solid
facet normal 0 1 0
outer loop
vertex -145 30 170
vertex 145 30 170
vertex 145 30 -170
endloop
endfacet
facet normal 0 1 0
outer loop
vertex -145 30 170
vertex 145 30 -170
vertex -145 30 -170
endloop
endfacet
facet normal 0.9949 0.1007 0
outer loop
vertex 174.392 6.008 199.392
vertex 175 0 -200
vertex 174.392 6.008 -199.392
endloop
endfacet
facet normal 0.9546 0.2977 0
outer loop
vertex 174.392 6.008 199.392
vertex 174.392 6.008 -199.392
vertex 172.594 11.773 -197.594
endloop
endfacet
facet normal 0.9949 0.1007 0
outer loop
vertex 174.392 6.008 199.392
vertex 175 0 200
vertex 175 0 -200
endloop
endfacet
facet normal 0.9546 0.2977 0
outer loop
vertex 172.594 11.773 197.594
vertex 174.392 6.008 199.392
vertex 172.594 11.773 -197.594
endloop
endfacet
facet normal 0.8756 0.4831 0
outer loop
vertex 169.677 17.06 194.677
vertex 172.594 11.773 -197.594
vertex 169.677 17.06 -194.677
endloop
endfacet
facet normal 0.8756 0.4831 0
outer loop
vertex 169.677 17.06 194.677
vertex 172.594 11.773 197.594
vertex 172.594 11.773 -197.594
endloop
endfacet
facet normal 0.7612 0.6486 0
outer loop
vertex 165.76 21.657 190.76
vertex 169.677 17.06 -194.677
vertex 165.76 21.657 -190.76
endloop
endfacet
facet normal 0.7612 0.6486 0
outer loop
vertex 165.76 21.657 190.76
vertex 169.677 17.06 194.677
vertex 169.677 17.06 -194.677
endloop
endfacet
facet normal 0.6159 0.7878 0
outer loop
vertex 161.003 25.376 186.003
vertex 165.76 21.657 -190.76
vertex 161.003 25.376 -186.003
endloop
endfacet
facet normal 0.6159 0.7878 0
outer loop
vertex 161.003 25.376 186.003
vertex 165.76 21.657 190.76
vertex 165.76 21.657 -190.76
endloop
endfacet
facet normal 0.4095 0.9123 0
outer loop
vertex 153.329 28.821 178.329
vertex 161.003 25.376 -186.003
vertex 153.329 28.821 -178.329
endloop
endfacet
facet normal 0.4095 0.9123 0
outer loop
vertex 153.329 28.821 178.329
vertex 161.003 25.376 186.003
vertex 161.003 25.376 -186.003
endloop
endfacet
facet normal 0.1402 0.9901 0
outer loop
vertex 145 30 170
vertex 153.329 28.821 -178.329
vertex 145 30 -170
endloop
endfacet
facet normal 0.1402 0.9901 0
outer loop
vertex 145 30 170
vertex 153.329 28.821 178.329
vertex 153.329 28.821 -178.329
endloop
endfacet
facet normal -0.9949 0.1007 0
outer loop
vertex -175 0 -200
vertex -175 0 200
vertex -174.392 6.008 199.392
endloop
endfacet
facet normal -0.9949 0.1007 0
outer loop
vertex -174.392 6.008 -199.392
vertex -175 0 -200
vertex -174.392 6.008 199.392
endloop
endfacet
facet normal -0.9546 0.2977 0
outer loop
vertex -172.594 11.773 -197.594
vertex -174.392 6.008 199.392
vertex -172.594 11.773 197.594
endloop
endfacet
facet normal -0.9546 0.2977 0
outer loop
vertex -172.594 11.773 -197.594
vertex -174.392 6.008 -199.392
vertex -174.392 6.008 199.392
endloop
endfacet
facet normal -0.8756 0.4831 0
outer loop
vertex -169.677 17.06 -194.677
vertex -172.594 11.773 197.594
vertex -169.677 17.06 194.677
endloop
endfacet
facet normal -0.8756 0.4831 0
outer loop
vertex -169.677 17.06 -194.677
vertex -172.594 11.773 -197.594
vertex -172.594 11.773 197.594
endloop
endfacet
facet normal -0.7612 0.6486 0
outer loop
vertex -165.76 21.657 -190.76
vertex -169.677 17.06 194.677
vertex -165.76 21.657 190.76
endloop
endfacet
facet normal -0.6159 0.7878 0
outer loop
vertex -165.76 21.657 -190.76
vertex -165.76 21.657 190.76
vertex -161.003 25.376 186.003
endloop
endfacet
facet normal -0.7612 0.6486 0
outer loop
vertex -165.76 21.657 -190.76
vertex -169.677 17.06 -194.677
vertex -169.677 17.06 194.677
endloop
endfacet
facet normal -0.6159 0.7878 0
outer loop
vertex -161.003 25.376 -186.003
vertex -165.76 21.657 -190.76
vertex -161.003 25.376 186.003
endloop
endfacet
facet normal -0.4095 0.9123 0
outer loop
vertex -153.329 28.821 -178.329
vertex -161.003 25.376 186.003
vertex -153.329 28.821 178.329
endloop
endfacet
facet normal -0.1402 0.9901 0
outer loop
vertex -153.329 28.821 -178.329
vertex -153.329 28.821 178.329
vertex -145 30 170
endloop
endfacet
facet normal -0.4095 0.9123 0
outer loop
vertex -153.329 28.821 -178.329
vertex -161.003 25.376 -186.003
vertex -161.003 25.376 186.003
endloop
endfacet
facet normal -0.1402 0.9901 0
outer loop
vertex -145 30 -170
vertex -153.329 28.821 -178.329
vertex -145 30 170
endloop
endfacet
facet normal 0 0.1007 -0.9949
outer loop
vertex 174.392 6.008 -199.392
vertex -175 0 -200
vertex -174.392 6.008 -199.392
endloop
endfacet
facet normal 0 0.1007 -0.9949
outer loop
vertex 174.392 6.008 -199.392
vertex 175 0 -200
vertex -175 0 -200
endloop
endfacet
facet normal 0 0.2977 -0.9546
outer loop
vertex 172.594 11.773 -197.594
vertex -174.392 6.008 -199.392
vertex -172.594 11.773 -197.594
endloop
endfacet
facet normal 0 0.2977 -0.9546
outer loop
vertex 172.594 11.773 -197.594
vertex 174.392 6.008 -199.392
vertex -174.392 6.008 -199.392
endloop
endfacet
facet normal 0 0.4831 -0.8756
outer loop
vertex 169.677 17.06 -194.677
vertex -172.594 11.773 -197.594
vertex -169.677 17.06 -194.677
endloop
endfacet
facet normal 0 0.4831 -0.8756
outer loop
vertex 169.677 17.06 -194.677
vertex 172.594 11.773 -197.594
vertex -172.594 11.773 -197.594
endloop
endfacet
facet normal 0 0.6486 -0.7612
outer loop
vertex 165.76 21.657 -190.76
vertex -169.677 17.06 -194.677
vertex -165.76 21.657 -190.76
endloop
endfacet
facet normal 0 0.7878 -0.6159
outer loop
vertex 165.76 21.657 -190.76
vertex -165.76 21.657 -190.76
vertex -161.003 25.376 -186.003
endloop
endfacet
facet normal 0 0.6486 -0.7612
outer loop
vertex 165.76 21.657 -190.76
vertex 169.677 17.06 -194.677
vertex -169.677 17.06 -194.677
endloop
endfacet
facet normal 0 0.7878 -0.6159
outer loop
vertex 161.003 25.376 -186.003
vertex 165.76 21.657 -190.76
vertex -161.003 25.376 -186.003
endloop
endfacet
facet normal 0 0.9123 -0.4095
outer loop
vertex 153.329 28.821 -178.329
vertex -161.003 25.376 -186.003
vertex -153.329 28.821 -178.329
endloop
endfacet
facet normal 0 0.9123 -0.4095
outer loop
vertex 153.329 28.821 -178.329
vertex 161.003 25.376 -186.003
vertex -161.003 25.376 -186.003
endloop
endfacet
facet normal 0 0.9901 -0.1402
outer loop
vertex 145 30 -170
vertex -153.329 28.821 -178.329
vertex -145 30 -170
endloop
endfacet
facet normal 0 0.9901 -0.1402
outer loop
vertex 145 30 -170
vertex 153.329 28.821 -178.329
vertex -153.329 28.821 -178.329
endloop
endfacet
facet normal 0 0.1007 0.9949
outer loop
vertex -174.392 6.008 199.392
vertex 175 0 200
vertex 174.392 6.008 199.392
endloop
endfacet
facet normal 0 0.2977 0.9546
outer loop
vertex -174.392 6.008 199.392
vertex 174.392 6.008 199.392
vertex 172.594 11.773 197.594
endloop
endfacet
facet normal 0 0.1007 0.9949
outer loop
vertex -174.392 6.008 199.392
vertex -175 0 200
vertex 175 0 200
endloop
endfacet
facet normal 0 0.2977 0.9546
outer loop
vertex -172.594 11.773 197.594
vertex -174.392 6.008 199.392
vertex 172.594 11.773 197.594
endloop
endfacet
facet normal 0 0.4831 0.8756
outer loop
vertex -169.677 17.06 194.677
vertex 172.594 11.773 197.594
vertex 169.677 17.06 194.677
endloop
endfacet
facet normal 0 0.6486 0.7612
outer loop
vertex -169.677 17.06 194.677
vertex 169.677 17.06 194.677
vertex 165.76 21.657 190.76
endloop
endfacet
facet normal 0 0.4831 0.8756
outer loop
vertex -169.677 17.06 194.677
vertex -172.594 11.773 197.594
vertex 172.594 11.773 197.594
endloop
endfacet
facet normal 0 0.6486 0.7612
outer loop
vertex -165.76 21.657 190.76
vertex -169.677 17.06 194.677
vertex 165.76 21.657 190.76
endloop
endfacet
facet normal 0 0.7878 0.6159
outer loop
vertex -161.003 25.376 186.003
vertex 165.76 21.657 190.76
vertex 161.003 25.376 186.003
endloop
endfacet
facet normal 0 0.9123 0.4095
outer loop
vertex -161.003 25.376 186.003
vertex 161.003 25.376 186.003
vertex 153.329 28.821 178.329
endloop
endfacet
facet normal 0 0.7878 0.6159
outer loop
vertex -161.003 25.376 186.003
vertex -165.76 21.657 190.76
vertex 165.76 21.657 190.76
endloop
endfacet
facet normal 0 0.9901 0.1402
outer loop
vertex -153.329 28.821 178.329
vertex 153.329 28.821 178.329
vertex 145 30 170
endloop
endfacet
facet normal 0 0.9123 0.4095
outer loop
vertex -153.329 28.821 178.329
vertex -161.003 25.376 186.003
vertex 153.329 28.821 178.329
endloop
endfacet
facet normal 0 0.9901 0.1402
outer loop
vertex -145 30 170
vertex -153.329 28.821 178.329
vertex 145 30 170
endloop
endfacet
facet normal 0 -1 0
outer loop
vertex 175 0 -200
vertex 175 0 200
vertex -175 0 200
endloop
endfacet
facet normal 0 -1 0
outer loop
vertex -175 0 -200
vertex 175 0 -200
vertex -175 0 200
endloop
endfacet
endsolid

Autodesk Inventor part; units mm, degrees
ref_plane "YZ Plane" through (0, 0, 0) normal (1, 0, 0) x (0, 1, 0)
ref_plane "XZ Plane" through (0, 0, 0) normal (0, 1, 0) x (-1, 0, 0)
ref_plane "XY Plane" through (0, 0, 0) normal (0, 0, 1) x (1, 0, 0)
sketch "Sketch1" plane through (0, 0, 0) normal (0, 1, 0) x (-1, 0, 0)
  line L0 (-175, 200) -> (175, 200)
  line L1 (175, 200) -> (175, -200)
  line L2 (175, -200) -> (-175, -200)
  line L3 (-175, -200) -> (-175, 200)
  line L4 (-175, 200) -> (175, -200) construction
  line L5 (175, 200) -> (-175, -200) construction
  point P0 (0, 0)
  dimension "d0" = 350
  dimension "d1" = 400
extrude "Extrusion1" add sketch "Sketch1" along normal blind 30
fillet "Fillet1" radius 30 4 edges at (0, 30, 200) (-175, 30, 0) (175, 30, 0) (0, 30, -200)
